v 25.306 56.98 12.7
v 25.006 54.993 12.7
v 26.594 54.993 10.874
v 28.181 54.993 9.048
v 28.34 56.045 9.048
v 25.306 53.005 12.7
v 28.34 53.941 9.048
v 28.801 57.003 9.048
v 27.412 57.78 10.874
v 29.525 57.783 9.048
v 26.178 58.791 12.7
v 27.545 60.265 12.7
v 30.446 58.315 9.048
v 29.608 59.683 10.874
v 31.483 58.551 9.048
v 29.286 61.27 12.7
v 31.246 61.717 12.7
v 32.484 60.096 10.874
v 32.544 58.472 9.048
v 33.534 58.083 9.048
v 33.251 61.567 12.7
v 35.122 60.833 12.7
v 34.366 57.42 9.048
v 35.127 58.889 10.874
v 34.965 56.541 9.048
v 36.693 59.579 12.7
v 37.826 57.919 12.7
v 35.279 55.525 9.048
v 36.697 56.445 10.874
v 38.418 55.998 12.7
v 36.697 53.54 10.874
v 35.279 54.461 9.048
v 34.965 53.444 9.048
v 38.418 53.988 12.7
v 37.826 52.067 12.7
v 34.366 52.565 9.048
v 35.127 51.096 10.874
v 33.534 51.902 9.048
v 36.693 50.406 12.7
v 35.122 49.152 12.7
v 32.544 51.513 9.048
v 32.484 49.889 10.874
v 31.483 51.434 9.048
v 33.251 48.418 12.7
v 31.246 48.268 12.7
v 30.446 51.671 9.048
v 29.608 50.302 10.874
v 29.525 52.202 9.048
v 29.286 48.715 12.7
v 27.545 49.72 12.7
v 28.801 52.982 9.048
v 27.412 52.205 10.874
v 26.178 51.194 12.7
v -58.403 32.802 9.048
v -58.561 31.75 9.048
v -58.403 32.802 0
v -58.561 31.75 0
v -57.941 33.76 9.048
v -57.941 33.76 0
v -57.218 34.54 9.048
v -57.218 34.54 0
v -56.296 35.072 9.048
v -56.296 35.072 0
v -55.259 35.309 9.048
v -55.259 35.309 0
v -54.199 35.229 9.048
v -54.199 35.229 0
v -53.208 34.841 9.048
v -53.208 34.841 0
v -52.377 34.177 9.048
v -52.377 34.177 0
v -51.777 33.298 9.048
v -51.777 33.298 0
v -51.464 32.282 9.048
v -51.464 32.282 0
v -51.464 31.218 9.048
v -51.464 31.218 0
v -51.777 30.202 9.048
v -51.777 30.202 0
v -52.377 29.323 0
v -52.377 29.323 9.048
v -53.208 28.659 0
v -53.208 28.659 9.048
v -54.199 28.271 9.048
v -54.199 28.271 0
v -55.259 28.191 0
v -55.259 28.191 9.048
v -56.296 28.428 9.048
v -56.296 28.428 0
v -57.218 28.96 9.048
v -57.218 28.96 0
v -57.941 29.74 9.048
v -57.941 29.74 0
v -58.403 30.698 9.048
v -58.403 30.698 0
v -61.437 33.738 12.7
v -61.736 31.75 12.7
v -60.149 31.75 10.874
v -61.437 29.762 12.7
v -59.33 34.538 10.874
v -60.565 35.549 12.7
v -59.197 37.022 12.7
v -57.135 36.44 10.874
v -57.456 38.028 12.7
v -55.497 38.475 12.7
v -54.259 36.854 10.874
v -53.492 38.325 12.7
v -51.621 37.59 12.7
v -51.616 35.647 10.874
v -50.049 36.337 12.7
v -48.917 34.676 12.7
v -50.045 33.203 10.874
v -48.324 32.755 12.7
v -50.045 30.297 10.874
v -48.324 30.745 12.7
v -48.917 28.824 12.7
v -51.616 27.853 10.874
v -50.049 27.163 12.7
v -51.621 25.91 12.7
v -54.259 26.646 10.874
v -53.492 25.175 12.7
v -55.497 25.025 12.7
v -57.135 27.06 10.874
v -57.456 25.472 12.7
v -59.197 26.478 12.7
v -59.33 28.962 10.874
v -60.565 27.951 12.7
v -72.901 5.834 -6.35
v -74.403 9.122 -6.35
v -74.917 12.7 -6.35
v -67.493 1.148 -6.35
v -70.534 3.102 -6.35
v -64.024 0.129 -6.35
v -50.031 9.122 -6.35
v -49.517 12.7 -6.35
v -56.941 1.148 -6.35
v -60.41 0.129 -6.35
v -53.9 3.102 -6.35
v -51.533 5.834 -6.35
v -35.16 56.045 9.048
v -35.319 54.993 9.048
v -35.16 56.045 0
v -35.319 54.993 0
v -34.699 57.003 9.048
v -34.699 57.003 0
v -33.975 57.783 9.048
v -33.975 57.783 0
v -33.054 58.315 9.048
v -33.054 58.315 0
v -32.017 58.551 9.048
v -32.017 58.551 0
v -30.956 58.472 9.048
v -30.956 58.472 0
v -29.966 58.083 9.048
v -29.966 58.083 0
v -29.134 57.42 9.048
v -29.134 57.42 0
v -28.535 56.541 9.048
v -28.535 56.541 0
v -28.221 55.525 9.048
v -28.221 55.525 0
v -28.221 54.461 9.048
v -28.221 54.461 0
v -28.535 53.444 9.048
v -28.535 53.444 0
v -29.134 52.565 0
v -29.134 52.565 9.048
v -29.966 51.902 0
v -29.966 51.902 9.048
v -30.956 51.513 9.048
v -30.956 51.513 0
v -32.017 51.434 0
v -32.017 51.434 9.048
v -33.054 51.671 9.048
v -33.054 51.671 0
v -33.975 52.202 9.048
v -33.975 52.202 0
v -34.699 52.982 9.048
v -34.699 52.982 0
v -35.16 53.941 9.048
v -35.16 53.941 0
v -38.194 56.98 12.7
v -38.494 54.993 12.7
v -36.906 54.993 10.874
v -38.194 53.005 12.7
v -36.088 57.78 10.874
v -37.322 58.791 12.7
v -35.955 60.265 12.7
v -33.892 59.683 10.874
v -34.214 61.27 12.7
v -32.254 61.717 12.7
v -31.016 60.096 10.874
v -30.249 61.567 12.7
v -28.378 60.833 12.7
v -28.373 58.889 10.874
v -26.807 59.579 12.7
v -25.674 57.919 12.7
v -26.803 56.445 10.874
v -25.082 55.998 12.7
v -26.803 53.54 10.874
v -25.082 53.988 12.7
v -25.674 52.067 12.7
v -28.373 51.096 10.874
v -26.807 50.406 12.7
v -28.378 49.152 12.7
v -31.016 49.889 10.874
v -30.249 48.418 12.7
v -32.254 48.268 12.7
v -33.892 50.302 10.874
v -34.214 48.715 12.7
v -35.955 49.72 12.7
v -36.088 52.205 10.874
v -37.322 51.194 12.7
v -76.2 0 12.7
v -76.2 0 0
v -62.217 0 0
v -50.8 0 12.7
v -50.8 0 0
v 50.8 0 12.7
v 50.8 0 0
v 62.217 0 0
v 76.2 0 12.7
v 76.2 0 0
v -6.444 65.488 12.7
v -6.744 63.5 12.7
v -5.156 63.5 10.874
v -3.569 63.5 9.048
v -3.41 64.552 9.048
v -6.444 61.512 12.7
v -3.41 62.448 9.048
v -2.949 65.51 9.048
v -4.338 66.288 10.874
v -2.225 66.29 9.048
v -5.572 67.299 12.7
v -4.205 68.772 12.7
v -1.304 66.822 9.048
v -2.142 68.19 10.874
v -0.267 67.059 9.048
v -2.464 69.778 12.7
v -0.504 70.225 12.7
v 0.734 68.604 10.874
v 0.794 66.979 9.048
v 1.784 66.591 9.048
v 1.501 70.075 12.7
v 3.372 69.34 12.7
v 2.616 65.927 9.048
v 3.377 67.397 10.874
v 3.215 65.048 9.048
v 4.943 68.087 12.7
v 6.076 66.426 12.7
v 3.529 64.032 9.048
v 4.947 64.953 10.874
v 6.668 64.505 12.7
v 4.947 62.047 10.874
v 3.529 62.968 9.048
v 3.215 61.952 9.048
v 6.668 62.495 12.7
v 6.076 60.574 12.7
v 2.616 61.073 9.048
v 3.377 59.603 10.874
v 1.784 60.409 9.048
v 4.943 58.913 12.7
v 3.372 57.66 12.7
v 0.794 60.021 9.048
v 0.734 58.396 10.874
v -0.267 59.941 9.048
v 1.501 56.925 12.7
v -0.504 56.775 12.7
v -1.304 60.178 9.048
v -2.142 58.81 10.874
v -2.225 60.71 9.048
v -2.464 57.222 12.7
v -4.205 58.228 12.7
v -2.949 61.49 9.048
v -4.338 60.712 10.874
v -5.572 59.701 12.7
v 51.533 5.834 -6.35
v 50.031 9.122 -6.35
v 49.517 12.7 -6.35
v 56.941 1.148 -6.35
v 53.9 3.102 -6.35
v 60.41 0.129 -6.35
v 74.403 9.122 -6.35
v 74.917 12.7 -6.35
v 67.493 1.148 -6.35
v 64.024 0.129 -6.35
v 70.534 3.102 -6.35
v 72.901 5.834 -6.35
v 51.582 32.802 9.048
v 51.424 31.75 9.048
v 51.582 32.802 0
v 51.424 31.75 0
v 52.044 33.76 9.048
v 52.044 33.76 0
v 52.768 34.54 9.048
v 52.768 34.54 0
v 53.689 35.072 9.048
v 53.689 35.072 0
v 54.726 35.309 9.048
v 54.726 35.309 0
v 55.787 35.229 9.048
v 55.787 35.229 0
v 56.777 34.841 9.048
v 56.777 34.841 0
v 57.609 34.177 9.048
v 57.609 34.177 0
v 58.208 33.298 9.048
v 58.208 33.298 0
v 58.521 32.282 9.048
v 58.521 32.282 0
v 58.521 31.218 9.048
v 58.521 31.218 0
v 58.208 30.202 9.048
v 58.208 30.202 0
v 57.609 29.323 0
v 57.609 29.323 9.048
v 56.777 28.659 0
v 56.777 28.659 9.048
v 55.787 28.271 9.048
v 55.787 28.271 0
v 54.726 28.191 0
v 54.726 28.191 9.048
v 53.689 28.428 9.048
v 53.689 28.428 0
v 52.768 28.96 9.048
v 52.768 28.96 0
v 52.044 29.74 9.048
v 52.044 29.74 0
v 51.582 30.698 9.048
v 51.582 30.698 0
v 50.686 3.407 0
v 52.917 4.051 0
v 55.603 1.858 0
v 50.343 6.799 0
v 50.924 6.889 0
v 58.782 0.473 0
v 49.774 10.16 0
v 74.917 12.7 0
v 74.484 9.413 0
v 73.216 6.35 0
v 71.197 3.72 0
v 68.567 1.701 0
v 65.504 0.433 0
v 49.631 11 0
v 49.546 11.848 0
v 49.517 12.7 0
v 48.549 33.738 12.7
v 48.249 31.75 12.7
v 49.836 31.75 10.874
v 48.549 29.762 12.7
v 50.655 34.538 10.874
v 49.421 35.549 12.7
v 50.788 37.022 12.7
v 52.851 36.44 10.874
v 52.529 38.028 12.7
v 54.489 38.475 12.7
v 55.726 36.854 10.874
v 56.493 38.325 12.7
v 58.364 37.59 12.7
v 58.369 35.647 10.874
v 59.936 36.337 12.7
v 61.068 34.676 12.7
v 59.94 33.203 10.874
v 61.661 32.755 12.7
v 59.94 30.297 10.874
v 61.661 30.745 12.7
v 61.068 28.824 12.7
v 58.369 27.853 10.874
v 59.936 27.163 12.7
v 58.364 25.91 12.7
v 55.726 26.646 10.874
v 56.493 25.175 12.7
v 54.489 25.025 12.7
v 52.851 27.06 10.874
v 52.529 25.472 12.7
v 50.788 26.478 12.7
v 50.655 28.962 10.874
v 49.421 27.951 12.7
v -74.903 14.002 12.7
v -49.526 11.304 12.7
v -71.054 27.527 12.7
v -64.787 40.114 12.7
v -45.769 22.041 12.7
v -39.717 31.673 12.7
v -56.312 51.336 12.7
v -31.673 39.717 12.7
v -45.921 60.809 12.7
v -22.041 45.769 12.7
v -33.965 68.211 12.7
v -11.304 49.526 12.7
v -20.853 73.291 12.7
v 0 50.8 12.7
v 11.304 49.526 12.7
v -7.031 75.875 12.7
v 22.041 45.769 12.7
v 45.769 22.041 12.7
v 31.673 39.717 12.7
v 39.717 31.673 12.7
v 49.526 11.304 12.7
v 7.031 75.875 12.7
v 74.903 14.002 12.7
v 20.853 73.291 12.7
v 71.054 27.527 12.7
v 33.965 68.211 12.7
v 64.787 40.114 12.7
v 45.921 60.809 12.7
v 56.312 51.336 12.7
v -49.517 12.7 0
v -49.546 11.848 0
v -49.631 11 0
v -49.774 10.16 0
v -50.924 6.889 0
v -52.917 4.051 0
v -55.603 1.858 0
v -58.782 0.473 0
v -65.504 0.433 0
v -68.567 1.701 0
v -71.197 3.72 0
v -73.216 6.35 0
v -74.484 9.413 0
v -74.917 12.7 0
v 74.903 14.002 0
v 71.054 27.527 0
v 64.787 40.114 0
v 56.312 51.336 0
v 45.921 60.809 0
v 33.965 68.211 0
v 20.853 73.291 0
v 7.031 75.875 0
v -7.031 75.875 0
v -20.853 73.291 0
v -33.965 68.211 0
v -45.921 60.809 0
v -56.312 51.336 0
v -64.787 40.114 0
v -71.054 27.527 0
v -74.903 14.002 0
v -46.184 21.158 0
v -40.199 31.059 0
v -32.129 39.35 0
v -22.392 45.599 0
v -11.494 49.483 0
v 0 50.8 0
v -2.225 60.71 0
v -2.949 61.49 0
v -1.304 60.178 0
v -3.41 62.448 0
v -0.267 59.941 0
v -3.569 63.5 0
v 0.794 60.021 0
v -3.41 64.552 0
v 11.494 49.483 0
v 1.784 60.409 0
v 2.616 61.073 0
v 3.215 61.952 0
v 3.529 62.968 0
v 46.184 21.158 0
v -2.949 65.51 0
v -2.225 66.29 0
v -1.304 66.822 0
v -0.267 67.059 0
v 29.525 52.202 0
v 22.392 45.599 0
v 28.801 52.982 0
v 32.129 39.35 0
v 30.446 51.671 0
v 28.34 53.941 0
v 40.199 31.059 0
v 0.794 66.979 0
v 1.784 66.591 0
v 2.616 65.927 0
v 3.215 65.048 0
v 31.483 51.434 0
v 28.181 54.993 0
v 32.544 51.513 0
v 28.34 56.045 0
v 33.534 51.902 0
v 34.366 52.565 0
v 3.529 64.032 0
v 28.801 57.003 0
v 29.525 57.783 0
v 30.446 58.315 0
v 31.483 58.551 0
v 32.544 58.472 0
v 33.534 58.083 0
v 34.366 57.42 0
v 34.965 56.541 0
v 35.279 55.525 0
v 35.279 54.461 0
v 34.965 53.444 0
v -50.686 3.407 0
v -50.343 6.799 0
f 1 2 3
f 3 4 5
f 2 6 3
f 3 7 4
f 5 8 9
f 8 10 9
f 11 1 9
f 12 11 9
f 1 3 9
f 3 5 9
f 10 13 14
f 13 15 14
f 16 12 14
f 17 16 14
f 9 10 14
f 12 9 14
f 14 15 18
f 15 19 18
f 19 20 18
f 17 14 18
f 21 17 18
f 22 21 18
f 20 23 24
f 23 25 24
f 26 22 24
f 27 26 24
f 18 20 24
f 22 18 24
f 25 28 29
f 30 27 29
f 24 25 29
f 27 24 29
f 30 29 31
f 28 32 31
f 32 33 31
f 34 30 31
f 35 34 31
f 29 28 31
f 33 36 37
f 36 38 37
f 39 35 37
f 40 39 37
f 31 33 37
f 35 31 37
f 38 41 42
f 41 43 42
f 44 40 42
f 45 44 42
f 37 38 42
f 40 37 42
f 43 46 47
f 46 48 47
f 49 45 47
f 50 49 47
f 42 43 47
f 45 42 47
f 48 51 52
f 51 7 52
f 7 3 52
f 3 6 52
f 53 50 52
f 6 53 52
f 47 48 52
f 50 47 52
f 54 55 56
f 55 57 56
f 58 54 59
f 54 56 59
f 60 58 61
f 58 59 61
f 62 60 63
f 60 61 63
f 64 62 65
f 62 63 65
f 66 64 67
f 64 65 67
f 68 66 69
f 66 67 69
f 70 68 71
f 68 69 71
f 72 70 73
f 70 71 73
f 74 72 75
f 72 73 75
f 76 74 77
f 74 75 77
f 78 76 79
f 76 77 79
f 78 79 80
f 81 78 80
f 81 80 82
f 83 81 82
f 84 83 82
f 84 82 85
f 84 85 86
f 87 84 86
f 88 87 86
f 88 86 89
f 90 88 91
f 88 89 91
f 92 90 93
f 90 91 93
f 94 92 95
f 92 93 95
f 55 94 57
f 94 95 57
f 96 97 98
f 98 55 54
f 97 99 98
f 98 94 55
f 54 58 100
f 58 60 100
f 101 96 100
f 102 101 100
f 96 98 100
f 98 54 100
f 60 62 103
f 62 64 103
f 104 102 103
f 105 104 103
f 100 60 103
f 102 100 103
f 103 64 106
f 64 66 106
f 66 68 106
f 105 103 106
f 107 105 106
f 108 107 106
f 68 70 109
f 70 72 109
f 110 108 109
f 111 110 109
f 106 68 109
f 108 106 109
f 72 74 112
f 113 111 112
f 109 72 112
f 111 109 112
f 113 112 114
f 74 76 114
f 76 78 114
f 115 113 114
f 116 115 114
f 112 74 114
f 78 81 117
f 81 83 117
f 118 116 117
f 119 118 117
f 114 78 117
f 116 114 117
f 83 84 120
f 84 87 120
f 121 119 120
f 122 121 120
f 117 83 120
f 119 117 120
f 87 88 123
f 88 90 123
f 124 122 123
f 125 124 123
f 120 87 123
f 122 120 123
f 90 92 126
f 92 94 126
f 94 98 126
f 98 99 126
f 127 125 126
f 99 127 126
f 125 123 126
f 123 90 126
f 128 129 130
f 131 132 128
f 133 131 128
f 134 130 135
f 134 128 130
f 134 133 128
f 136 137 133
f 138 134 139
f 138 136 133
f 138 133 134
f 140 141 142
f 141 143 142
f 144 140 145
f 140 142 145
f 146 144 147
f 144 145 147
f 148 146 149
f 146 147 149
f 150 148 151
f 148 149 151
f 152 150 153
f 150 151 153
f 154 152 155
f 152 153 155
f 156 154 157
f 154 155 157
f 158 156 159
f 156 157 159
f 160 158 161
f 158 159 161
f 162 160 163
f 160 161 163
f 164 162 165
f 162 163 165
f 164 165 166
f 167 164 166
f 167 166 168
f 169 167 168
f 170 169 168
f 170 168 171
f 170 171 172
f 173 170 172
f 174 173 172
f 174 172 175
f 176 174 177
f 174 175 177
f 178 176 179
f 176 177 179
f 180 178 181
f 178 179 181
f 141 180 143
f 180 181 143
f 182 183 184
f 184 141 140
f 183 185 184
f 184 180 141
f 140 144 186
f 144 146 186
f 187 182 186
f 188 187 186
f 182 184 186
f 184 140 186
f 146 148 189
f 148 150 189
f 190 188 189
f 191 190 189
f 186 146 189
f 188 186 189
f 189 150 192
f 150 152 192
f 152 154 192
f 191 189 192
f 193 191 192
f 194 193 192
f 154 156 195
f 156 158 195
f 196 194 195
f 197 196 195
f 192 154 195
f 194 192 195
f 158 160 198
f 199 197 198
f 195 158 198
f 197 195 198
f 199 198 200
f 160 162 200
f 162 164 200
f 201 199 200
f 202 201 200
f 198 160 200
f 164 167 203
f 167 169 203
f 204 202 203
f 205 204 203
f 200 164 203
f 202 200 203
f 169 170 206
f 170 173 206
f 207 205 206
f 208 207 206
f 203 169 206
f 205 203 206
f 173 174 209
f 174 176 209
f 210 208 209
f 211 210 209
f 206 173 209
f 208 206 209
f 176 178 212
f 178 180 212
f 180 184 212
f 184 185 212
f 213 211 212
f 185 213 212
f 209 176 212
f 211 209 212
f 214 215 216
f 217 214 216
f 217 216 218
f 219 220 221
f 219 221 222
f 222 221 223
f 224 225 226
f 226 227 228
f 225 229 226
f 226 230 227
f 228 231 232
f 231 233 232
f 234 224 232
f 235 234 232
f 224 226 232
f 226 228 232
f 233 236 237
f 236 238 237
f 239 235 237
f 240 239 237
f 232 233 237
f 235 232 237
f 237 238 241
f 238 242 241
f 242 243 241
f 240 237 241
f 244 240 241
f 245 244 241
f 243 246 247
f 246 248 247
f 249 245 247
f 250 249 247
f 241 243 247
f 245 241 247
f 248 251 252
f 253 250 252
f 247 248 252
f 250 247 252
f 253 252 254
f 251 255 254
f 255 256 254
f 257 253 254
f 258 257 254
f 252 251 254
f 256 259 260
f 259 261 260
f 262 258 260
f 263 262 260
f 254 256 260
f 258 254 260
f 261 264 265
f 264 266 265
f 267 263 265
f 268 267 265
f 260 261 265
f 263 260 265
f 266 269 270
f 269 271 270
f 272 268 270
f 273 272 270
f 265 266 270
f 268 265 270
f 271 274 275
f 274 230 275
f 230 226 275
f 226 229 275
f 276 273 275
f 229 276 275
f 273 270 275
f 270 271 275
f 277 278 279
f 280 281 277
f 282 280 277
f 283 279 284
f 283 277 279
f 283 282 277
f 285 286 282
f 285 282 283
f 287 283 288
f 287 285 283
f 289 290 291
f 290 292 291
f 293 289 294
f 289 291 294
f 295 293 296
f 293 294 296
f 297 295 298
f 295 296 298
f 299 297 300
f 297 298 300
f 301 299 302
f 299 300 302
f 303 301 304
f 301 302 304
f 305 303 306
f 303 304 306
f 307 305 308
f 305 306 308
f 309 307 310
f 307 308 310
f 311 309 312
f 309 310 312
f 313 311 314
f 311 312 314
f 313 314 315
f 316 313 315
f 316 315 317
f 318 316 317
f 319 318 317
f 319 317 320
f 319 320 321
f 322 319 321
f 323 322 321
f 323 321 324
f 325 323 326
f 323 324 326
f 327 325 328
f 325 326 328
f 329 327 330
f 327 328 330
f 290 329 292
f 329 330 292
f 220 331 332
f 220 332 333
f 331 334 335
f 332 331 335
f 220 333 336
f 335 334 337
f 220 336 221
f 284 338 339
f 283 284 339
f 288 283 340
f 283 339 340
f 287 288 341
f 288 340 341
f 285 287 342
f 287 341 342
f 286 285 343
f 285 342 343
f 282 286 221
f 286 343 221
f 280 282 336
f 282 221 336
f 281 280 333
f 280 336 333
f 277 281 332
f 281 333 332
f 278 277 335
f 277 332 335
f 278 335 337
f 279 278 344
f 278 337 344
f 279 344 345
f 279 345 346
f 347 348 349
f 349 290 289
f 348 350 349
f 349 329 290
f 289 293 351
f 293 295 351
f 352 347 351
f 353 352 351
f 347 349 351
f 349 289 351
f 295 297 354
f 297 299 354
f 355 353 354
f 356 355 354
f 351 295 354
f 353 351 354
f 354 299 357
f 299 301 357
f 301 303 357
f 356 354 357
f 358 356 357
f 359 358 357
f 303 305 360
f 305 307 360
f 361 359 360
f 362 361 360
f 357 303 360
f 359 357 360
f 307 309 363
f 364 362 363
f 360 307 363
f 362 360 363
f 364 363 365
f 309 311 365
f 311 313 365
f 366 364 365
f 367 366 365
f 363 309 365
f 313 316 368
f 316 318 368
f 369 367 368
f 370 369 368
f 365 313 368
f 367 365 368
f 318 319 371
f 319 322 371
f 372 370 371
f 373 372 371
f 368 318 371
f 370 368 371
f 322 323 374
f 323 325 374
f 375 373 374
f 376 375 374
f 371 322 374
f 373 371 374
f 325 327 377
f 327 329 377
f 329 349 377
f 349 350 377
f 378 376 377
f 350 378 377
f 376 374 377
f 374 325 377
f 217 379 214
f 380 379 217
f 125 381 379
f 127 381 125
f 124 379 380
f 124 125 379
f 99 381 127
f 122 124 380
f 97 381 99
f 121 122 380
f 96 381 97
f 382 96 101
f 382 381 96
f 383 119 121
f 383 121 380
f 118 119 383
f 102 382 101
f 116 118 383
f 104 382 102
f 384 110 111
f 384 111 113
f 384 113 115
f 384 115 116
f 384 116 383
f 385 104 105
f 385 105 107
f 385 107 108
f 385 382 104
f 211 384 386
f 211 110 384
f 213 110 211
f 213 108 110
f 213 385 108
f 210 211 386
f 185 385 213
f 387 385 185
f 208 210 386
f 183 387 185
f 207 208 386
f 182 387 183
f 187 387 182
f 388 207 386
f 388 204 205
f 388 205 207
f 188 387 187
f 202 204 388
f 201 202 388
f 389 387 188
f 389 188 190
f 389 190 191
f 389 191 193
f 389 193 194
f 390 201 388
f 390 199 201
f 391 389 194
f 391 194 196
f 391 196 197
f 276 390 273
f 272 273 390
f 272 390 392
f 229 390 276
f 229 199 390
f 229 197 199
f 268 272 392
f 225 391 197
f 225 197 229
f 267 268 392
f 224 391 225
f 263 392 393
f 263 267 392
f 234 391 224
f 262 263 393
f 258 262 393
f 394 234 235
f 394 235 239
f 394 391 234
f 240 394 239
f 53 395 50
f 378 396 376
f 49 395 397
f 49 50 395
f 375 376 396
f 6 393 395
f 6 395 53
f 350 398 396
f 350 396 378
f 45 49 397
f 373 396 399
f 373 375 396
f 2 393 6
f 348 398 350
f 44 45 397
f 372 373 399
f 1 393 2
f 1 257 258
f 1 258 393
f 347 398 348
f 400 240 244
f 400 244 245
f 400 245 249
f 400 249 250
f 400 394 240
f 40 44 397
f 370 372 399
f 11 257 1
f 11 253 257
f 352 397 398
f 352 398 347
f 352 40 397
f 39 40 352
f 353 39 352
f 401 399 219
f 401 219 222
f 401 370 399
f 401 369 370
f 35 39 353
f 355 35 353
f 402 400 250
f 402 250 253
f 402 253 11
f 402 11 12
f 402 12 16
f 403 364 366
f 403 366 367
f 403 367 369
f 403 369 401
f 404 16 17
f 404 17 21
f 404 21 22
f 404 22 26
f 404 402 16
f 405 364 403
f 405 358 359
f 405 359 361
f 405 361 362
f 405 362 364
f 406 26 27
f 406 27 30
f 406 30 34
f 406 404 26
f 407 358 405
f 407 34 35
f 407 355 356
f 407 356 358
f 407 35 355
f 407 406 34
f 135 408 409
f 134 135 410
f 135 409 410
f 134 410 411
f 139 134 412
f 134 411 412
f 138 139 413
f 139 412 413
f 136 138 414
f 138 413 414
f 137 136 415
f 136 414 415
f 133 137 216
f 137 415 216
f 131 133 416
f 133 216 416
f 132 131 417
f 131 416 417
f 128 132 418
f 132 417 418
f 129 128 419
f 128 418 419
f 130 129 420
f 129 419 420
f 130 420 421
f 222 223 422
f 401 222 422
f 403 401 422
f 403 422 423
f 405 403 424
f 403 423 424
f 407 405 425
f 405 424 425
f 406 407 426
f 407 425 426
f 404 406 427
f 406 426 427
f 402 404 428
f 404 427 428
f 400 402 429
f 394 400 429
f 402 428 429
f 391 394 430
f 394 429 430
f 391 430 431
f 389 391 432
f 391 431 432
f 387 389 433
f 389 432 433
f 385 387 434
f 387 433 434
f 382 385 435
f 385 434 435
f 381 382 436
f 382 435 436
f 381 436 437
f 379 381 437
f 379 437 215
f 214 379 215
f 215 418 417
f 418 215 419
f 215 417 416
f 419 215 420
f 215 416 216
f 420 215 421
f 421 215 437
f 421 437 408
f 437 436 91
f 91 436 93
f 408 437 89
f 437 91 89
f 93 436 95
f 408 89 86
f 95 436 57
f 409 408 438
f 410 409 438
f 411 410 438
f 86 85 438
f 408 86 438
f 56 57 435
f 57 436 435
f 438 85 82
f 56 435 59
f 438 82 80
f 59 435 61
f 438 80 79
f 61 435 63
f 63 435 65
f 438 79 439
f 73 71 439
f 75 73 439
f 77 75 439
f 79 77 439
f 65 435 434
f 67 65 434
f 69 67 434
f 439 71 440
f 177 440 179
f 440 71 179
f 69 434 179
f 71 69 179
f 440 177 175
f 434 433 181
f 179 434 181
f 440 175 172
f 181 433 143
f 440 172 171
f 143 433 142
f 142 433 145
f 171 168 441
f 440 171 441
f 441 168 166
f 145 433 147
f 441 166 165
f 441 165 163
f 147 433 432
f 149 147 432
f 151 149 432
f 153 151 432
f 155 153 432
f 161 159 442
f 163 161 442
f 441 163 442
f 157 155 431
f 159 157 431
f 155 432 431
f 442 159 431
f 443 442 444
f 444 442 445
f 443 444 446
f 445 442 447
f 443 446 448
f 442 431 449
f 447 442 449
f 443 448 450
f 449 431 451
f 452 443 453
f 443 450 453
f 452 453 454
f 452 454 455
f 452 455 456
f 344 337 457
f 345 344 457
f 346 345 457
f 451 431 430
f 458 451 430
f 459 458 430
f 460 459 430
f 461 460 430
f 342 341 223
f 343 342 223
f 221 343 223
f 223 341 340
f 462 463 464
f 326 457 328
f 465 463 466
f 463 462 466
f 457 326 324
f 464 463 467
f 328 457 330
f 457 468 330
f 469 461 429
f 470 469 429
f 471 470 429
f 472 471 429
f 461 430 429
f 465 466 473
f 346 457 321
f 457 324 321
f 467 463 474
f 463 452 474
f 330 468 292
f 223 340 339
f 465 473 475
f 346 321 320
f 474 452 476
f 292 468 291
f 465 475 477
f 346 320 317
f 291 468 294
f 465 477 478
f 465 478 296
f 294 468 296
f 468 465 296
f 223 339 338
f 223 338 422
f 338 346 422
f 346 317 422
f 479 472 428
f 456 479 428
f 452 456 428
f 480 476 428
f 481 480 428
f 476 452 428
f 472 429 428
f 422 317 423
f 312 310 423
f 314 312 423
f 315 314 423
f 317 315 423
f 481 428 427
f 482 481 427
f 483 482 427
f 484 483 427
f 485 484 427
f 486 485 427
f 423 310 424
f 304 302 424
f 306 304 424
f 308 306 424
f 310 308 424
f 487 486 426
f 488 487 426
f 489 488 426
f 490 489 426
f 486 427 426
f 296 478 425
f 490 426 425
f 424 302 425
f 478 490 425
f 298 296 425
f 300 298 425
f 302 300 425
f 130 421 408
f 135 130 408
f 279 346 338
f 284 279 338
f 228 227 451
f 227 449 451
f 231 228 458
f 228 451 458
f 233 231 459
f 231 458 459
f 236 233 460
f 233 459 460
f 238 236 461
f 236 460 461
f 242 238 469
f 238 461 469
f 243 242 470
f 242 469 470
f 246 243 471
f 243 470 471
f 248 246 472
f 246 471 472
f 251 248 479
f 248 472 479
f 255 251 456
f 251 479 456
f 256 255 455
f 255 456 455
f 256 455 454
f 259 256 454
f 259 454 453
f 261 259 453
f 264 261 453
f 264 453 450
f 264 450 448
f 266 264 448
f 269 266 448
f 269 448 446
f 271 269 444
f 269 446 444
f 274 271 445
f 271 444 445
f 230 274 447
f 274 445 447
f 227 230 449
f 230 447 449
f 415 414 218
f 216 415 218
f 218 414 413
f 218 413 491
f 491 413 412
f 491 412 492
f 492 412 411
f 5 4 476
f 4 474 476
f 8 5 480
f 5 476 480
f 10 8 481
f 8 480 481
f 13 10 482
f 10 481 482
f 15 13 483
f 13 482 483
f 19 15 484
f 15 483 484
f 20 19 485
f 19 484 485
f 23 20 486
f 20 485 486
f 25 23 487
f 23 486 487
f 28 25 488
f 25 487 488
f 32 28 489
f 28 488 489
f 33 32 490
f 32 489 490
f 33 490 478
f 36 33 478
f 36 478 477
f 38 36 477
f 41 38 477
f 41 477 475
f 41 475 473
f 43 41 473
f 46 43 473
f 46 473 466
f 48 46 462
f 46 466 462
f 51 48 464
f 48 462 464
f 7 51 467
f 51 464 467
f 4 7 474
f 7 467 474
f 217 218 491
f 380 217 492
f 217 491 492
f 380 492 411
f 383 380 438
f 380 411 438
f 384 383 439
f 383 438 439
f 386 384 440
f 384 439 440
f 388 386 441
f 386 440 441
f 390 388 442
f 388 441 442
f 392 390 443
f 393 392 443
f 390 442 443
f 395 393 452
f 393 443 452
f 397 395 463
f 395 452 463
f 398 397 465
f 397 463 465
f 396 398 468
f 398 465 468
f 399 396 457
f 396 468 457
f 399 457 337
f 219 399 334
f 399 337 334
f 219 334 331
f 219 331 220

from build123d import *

# Parameters (mm, degrees)
F1_DEPTH       = 12.7
F3_DEPTH       = 6.35
F5_D           = 7.1374
F5_CSINK_D     = 13.4874
F5_CSINK_ANGLE = 82


with BuildPart() as f1:
    # F0 (on Top) → F1 (new body)
    with BuildSketch(Plane.XY):
        with BuildLine():
            Line((-76.2, 0), (-50.8, 0))
            ThreePointArc((-50.8, 0), (0, 50.8), (50.8, 0))
            Line((50.8, 0), (76.2, 0))
            ThreePointArc((76.2, 0), (0, 76.2), (-76.2, 0))
        make_face()
    extrude(amount=F1_DEPTH)

    # F2 (on face) → F3 (join)
    with BuildSketch(Plane(origin=(0, 0, 0), x_dir=(1, 0, 0), z_dir=(0, 0, -1))):
        with BuildLine():
            Line((-62.2170394667, -12.7), (-49.5170394667, -12.7))
            ThreePointArc((-49.5170394667, -12.7), (-62.2170394667, 0), (-74.9170394667, -12.7))
            Line((-74.9170394667, -12.7), (-62.2170394667, -12.7))
        make_face()
        with BuildLine():
            ThreePointArc((74.9170394667, -12.7), (62.2170394667, 0), (49.5170394667, -12.7))
            Line((49.5170394667, -12.7), (62.2170394667, -12.7))
            Line((62.2170394667, -12.7), (74.9170394667, -12.7))
        make_face()
    extrude(amount=F3_DEPTH)

    # F5 (through all)
    with Locations(Plane.XY.offset(12.7)):
        with Locations((-54.9926131403, 31.75), (-31.75, 54.9926131403), (0, 63.5), (31.75, 54.9926131403), (54.9926131403, 31.75)):
            CounterSinkHole(F5_D / 2, F5_CSINK_D / 2, counter_sink_angle=F5_CSINK_ANGLE)


solid = f1.part
